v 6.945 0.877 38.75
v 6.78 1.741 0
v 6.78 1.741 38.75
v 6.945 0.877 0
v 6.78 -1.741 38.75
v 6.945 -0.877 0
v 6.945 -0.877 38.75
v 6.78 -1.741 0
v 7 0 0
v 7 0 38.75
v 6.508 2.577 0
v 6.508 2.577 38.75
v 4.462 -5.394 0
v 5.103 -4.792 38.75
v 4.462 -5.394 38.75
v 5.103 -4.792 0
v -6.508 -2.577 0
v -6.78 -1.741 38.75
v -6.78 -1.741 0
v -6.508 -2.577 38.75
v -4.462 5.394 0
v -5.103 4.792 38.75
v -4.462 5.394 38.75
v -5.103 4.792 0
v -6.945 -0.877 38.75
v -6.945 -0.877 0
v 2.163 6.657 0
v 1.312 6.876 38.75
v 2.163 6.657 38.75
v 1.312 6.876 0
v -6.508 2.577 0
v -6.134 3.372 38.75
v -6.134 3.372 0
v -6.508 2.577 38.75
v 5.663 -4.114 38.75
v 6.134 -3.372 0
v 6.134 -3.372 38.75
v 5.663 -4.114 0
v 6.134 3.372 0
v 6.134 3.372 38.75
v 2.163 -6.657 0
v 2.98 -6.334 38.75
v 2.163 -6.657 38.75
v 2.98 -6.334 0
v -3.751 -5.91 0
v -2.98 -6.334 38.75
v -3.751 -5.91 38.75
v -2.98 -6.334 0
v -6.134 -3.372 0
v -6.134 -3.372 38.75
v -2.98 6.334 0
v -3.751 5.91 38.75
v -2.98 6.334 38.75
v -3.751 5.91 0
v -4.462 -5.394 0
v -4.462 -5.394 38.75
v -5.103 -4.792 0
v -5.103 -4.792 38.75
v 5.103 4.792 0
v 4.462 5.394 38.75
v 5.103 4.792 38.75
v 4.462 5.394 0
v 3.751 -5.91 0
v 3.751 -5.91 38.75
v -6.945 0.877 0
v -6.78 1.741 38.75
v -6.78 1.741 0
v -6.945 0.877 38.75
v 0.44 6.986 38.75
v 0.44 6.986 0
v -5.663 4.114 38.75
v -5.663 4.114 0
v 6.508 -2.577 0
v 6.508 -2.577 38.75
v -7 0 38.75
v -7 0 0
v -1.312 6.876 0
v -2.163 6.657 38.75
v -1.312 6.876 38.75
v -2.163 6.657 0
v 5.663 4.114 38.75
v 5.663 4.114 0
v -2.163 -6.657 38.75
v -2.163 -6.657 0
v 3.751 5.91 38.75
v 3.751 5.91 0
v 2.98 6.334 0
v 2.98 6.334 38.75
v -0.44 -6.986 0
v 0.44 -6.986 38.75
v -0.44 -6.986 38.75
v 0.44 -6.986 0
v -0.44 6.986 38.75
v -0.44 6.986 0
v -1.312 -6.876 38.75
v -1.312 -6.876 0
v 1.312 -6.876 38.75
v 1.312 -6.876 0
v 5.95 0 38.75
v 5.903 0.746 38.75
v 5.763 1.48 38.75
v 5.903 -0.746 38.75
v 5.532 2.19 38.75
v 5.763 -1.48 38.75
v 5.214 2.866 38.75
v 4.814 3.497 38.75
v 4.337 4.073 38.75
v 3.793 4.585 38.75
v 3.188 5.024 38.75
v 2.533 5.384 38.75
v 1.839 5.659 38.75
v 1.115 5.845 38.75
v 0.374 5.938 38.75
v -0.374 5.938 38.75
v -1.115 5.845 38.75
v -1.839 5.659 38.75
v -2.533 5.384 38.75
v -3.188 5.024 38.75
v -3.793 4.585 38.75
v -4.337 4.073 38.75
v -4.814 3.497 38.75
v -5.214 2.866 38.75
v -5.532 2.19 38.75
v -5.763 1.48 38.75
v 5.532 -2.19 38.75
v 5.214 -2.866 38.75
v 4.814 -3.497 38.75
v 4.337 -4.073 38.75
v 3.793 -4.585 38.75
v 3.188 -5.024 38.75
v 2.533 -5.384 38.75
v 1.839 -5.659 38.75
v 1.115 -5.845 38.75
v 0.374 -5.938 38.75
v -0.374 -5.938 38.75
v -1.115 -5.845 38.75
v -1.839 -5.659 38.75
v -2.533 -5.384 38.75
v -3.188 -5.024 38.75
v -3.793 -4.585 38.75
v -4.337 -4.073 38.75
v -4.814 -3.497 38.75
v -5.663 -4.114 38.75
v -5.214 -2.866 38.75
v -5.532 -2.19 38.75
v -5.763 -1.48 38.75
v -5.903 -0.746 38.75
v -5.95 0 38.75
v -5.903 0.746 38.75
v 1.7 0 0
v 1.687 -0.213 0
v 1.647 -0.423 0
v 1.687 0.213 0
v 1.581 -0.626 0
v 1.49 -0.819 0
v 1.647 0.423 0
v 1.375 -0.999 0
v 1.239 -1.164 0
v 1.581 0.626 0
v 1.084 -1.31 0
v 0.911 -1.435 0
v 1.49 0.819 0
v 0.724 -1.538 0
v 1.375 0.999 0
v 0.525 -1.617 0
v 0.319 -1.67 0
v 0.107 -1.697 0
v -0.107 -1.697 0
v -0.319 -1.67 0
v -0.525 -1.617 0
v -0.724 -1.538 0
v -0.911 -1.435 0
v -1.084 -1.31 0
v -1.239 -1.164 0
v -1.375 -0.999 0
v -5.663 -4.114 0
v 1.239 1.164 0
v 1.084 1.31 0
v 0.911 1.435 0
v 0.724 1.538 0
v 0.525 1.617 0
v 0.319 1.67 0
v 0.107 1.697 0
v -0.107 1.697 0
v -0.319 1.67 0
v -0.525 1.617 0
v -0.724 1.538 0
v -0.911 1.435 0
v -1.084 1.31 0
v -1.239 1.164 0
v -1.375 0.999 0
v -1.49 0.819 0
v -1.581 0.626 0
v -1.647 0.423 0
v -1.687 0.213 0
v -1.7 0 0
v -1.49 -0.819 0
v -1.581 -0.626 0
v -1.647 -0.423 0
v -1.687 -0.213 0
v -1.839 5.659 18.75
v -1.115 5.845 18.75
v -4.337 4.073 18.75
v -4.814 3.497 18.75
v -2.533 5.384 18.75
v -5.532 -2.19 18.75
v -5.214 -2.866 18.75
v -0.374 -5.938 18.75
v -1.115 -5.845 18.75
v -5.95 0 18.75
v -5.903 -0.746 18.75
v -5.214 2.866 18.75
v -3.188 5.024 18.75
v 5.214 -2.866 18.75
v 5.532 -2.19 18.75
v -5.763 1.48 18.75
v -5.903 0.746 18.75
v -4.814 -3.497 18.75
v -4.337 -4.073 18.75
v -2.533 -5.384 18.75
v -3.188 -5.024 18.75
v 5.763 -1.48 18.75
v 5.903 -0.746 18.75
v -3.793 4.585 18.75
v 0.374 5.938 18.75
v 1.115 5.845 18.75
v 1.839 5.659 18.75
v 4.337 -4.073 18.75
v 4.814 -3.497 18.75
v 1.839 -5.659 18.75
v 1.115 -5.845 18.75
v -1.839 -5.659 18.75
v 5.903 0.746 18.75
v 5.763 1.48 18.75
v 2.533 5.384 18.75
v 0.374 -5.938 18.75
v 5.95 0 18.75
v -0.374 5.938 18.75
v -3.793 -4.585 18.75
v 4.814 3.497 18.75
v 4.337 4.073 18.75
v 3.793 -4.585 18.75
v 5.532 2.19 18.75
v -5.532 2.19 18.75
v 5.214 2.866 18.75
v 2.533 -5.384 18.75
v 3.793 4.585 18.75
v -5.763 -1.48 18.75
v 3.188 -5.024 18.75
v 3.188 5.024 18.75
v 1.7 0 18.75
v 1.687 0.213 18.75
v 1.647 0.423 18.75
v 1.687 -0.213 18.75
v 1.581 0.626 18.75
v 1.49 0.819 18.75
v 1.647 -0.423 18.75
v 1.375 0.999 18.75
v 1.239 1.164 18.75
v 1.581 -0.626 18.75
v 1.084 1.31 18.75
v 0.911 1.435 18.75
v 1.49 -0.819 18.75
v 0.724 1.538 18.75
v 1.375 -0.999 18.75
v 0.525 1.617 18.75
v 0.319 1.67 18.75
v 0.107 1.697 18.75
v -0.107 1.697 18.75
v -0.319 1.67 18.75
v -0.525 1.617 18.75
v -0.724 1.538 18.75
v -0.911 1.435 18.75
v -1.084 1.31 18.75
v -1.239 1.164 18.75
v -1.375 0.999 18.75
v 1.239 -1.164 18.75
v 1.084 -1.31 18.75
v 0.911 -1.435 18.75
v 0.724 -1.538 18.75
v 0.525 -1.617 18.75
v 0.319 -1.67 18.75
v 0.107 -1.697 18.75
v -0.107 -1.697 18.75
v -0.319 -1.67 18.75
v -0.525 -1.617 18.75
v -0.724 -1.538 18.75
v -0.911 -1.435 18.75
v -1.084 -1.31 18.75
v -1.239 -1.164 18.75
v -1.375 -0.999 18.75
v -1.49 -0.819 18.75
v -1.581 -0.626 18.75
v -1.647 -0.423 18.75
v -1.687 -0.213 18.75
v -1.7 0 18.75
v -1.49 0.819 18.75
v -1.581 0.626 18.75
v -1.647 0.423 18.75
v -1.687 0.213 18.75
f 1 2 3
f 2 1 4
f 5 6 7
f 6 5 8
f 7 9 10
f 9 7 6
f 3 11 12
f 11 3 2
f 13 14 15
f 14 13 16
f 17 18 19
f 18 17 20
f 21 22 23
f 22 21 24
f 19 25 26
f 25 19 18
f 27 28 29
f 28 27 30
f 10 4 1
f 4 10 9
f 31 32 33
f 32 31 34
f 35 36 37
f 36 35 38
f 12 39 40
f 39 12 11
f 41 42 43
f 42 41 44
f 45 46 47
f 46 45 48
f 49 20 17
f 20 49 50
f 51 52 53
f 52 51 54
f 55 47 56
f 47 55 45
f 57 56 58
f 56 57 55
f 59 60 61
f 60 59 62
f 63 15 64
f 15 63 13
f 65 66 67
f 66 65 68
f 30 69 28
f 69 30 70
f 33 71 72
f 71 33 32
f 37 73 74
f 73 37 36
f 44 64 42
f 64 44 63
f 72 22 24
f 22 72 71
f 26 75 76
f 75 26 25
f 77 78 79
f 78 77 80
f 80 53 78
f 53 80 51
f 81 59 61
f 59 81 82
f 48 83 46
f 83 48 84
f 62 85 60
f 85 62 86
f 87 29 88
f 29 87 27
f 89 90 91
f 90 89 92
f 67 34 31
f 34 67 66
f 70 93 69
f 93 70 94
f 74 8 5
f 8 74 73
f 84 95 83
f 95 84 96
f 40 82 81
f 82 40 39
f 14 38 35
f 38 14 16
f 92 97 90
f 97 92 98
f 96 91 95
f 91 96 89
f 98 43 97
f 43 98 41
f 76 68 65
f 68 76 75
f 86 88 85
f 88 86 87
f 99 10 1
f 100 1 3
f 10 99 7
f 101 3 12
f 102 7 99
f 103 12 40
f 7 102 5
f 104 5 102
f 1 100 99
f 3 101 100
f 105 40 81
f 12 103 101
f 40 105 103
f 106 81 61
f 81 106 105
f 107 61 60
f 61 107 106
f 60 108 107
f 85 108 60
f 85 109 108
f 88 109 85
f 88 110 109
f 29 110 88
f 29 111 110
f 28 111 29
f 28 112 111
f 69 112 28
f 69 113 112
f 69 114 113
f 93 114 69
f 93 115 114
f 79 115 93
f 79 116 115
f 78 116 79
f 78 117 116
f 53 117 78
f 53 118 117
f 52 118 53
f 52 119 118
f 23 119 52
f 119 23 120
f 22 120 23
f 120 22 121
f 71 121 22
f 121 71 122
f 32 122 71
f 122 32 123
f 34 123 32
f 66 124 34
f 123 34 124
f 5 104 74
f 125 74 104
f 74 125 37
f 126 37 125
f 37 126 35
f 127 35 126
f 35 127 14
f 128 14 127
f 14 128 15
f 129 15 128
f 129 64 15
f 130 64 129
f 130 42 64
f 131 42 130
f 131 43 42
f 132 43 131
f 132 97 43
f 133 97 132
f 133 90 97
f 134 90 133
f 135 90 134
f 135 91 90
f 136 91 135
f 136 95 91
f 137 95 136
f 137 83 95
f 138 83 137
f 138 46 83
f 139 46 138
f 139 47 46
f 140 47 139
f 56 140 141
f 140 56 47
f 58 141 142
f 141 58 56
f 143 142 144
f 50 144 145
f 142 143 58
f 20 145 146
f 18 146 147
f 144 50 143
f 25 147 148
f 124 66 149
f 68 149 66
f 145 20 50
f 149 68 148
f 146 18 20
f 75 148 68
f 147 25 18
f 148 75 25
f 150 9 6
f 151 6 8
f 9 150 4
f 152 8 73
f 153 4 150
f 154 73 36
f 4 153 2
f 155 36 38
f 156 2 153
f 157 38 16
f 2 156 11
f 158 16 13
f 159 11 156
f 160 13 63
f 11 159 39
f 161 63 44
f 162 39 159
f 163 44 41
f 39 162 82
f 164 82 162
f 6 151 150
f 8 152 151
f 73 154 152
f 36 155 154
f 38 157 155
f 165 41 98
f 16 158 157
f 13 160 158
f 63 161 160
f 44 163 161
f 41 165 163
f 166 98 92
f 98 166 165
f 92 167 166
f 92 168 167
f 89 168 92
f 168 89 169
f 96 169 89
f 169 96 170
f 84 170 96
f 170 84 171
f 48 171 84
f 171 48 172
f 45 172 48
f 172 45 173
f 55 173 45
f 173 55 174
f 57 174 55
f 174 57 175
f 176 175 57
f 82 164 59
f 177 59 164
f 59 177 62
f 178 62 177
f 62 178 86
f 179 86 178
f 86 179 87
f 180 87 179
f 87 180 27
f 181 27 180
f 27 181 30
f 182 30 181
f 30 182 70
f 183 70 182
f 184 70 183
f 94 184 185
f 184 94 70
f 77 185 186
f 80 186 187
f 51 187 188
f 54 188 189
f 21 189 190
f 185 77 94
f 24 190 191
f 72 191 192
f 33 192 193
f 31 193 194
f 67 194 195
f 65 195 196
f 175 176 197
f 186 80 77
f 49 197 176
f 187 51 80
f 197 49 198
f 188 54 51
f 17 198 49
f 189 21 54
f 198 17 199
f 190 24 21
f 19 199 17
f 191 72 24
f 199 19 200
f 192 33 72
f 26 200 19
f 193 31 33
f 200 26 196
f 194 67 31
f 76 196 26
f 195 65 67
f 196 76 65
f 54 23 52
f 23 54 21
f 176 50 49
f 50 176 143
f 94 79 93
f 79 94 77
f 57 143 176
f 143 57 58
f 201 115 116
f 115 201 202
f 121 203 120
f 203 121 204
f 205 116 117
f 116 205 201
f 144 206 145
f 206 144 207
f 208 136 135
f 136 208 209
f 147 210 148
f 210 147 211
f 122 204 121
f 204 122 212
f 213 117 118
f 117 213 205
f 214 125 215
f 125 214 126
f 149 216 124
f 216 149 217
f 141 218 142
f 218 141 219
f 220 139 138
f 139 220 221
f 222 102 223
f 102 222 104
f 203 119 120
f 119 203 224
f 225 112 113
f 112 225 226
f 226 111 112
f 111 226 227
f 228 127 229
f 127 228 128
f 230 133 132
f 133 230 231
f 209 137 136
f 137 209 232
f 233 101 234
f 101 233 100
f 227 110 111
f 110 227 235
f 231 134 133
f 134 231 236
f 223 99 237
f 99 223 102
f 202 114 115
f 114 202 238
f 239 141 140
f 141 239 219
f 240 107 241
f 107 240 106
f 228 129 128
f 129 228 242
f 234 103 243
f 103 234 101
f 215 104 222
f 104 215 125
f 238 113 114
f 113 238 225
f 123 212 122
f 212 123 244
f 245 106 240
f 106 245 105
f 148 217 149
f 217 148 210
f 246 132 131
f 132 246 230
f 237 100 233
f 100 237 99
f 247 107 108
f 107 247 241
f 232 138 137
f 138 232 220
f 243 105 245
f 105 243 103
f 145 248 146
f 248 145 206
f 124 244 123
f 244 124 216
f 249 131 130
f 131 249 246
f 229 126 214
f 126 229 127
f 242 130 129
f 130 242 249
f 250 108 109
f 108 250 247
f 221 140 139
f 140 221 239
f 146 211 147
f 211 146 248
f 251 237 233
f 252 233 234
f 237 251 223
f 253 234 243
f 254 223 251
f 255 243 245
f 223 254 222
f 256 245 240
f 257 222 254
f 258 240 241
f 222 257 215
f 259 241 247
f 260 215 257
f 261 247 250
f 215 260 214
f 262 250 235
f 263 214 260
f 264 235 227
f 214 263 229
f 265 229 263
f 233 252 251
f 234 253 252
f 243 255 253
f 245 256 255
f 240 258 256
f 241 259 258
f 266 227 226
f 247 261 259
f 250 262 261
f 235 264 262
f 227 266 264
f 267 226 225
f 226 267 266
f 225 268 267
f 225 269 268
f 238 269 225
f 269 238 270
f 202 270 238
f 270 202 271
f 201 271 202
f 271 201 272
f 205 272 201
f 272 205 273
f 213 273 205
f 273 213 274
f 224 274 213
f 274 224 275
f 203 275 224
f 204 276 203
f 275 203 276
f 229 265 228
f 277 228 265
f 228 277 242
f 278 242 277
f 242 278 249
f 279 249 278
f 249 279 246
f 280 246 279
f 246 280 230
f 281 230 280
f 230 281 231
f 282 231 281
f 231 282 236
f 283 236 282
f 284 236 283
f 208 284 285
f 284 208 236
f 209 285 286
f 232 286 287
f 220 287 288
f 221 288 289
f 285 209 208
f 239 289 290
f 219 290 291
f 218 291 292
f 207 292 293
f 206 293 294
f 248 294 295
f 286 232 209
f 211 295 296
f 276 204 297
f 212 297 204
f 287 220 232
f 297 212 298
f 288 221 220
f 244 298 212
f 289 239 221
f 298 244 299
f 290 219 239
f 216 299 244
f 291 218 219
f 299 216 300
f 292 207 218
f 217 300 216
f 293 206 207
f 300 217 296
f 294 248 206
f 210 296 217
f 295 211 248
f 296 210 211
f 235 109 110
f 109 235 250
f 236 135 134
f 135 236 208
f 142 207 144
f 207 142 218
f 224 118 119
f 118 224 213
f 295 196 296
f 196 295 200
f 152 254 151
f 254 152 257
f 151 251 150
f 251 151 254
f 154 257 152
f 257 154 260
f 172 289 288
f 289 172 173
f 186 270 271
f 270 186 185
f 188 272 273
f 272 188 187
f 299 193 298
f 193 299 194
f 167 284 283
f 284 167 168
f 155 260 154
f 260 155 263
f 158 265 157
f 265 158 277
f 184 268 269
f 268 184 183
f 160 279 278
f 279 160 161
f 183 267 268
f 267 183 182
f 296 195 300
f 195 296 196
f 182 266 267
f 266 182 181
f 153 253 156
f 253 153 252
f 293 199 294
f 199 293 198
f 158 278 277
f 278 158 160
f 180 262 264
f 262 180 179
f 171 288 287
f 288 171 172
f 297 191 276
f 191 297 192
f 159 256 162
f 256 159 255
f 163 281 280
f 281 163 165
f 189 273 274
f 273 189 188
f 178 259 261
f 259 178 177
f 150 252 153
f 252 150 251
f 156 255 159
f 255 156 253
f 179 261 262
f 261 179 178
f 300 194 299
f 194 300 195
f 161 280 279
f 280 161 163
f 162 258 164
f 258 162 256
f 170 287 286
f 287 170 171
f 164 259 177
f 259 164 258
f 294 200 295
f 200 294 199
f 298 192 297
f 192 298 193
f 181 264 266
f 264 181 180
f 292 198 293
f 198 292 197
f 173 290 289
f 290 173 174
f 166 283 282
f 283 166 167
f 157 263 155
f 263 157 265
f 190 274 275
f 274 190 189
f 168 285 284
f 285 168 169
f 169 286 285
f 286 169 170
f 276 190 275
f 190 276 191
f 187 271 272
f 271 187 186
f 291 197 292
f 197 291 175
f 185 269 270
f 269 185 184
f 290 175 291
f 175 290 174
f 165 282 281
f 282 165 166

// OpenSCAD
// Cut nail to 21mm and sand the ends until shiny before inserting into hole

NailShaftDiameter = 3.4;			// Nail diameter
NailHeadHeight = 1.25;			// Nail head height

main();

module main()
{
	$fn = 50;
	AdapterFillGapLength = 20;			// How much longer the battery needs to be (cut the nail to this length + 1mm, including the head)
	AdapterBatteryOverlapLength = 20;	// How much of the battery is covered by the adapeter
	BatteryDiameter = 11.4; 			// E90/N battery diameter
	AdapterOuterDiameter = 14; 			// AA battery diameter
	Tolerance = 0.25;					// Extra space to add around the battery to be able to slide it in and out easily

	translate([0, 0, AdapterBatteryOverlapLength + AdapterFillGapLength - NailHeadHeight])
	rotate([180, 0, 0])
		difference()
		{
			// Main body
			cylinder(d = AdapterOuterDiameter, h = AdapterBatteryOverlapLength + AdapterFillGapLength - NailHeadHeight);

			// Battery hole
			cylinder(d = BatteryDiameter + Tolerance * 2, h = AdapterBatteryOverlapLength);

			// Electrode hole
			cylinder(d = NailShaftDiameter, h = AdapterBatteryOverlapLength + AdapterFillGapLength);
		}
}
